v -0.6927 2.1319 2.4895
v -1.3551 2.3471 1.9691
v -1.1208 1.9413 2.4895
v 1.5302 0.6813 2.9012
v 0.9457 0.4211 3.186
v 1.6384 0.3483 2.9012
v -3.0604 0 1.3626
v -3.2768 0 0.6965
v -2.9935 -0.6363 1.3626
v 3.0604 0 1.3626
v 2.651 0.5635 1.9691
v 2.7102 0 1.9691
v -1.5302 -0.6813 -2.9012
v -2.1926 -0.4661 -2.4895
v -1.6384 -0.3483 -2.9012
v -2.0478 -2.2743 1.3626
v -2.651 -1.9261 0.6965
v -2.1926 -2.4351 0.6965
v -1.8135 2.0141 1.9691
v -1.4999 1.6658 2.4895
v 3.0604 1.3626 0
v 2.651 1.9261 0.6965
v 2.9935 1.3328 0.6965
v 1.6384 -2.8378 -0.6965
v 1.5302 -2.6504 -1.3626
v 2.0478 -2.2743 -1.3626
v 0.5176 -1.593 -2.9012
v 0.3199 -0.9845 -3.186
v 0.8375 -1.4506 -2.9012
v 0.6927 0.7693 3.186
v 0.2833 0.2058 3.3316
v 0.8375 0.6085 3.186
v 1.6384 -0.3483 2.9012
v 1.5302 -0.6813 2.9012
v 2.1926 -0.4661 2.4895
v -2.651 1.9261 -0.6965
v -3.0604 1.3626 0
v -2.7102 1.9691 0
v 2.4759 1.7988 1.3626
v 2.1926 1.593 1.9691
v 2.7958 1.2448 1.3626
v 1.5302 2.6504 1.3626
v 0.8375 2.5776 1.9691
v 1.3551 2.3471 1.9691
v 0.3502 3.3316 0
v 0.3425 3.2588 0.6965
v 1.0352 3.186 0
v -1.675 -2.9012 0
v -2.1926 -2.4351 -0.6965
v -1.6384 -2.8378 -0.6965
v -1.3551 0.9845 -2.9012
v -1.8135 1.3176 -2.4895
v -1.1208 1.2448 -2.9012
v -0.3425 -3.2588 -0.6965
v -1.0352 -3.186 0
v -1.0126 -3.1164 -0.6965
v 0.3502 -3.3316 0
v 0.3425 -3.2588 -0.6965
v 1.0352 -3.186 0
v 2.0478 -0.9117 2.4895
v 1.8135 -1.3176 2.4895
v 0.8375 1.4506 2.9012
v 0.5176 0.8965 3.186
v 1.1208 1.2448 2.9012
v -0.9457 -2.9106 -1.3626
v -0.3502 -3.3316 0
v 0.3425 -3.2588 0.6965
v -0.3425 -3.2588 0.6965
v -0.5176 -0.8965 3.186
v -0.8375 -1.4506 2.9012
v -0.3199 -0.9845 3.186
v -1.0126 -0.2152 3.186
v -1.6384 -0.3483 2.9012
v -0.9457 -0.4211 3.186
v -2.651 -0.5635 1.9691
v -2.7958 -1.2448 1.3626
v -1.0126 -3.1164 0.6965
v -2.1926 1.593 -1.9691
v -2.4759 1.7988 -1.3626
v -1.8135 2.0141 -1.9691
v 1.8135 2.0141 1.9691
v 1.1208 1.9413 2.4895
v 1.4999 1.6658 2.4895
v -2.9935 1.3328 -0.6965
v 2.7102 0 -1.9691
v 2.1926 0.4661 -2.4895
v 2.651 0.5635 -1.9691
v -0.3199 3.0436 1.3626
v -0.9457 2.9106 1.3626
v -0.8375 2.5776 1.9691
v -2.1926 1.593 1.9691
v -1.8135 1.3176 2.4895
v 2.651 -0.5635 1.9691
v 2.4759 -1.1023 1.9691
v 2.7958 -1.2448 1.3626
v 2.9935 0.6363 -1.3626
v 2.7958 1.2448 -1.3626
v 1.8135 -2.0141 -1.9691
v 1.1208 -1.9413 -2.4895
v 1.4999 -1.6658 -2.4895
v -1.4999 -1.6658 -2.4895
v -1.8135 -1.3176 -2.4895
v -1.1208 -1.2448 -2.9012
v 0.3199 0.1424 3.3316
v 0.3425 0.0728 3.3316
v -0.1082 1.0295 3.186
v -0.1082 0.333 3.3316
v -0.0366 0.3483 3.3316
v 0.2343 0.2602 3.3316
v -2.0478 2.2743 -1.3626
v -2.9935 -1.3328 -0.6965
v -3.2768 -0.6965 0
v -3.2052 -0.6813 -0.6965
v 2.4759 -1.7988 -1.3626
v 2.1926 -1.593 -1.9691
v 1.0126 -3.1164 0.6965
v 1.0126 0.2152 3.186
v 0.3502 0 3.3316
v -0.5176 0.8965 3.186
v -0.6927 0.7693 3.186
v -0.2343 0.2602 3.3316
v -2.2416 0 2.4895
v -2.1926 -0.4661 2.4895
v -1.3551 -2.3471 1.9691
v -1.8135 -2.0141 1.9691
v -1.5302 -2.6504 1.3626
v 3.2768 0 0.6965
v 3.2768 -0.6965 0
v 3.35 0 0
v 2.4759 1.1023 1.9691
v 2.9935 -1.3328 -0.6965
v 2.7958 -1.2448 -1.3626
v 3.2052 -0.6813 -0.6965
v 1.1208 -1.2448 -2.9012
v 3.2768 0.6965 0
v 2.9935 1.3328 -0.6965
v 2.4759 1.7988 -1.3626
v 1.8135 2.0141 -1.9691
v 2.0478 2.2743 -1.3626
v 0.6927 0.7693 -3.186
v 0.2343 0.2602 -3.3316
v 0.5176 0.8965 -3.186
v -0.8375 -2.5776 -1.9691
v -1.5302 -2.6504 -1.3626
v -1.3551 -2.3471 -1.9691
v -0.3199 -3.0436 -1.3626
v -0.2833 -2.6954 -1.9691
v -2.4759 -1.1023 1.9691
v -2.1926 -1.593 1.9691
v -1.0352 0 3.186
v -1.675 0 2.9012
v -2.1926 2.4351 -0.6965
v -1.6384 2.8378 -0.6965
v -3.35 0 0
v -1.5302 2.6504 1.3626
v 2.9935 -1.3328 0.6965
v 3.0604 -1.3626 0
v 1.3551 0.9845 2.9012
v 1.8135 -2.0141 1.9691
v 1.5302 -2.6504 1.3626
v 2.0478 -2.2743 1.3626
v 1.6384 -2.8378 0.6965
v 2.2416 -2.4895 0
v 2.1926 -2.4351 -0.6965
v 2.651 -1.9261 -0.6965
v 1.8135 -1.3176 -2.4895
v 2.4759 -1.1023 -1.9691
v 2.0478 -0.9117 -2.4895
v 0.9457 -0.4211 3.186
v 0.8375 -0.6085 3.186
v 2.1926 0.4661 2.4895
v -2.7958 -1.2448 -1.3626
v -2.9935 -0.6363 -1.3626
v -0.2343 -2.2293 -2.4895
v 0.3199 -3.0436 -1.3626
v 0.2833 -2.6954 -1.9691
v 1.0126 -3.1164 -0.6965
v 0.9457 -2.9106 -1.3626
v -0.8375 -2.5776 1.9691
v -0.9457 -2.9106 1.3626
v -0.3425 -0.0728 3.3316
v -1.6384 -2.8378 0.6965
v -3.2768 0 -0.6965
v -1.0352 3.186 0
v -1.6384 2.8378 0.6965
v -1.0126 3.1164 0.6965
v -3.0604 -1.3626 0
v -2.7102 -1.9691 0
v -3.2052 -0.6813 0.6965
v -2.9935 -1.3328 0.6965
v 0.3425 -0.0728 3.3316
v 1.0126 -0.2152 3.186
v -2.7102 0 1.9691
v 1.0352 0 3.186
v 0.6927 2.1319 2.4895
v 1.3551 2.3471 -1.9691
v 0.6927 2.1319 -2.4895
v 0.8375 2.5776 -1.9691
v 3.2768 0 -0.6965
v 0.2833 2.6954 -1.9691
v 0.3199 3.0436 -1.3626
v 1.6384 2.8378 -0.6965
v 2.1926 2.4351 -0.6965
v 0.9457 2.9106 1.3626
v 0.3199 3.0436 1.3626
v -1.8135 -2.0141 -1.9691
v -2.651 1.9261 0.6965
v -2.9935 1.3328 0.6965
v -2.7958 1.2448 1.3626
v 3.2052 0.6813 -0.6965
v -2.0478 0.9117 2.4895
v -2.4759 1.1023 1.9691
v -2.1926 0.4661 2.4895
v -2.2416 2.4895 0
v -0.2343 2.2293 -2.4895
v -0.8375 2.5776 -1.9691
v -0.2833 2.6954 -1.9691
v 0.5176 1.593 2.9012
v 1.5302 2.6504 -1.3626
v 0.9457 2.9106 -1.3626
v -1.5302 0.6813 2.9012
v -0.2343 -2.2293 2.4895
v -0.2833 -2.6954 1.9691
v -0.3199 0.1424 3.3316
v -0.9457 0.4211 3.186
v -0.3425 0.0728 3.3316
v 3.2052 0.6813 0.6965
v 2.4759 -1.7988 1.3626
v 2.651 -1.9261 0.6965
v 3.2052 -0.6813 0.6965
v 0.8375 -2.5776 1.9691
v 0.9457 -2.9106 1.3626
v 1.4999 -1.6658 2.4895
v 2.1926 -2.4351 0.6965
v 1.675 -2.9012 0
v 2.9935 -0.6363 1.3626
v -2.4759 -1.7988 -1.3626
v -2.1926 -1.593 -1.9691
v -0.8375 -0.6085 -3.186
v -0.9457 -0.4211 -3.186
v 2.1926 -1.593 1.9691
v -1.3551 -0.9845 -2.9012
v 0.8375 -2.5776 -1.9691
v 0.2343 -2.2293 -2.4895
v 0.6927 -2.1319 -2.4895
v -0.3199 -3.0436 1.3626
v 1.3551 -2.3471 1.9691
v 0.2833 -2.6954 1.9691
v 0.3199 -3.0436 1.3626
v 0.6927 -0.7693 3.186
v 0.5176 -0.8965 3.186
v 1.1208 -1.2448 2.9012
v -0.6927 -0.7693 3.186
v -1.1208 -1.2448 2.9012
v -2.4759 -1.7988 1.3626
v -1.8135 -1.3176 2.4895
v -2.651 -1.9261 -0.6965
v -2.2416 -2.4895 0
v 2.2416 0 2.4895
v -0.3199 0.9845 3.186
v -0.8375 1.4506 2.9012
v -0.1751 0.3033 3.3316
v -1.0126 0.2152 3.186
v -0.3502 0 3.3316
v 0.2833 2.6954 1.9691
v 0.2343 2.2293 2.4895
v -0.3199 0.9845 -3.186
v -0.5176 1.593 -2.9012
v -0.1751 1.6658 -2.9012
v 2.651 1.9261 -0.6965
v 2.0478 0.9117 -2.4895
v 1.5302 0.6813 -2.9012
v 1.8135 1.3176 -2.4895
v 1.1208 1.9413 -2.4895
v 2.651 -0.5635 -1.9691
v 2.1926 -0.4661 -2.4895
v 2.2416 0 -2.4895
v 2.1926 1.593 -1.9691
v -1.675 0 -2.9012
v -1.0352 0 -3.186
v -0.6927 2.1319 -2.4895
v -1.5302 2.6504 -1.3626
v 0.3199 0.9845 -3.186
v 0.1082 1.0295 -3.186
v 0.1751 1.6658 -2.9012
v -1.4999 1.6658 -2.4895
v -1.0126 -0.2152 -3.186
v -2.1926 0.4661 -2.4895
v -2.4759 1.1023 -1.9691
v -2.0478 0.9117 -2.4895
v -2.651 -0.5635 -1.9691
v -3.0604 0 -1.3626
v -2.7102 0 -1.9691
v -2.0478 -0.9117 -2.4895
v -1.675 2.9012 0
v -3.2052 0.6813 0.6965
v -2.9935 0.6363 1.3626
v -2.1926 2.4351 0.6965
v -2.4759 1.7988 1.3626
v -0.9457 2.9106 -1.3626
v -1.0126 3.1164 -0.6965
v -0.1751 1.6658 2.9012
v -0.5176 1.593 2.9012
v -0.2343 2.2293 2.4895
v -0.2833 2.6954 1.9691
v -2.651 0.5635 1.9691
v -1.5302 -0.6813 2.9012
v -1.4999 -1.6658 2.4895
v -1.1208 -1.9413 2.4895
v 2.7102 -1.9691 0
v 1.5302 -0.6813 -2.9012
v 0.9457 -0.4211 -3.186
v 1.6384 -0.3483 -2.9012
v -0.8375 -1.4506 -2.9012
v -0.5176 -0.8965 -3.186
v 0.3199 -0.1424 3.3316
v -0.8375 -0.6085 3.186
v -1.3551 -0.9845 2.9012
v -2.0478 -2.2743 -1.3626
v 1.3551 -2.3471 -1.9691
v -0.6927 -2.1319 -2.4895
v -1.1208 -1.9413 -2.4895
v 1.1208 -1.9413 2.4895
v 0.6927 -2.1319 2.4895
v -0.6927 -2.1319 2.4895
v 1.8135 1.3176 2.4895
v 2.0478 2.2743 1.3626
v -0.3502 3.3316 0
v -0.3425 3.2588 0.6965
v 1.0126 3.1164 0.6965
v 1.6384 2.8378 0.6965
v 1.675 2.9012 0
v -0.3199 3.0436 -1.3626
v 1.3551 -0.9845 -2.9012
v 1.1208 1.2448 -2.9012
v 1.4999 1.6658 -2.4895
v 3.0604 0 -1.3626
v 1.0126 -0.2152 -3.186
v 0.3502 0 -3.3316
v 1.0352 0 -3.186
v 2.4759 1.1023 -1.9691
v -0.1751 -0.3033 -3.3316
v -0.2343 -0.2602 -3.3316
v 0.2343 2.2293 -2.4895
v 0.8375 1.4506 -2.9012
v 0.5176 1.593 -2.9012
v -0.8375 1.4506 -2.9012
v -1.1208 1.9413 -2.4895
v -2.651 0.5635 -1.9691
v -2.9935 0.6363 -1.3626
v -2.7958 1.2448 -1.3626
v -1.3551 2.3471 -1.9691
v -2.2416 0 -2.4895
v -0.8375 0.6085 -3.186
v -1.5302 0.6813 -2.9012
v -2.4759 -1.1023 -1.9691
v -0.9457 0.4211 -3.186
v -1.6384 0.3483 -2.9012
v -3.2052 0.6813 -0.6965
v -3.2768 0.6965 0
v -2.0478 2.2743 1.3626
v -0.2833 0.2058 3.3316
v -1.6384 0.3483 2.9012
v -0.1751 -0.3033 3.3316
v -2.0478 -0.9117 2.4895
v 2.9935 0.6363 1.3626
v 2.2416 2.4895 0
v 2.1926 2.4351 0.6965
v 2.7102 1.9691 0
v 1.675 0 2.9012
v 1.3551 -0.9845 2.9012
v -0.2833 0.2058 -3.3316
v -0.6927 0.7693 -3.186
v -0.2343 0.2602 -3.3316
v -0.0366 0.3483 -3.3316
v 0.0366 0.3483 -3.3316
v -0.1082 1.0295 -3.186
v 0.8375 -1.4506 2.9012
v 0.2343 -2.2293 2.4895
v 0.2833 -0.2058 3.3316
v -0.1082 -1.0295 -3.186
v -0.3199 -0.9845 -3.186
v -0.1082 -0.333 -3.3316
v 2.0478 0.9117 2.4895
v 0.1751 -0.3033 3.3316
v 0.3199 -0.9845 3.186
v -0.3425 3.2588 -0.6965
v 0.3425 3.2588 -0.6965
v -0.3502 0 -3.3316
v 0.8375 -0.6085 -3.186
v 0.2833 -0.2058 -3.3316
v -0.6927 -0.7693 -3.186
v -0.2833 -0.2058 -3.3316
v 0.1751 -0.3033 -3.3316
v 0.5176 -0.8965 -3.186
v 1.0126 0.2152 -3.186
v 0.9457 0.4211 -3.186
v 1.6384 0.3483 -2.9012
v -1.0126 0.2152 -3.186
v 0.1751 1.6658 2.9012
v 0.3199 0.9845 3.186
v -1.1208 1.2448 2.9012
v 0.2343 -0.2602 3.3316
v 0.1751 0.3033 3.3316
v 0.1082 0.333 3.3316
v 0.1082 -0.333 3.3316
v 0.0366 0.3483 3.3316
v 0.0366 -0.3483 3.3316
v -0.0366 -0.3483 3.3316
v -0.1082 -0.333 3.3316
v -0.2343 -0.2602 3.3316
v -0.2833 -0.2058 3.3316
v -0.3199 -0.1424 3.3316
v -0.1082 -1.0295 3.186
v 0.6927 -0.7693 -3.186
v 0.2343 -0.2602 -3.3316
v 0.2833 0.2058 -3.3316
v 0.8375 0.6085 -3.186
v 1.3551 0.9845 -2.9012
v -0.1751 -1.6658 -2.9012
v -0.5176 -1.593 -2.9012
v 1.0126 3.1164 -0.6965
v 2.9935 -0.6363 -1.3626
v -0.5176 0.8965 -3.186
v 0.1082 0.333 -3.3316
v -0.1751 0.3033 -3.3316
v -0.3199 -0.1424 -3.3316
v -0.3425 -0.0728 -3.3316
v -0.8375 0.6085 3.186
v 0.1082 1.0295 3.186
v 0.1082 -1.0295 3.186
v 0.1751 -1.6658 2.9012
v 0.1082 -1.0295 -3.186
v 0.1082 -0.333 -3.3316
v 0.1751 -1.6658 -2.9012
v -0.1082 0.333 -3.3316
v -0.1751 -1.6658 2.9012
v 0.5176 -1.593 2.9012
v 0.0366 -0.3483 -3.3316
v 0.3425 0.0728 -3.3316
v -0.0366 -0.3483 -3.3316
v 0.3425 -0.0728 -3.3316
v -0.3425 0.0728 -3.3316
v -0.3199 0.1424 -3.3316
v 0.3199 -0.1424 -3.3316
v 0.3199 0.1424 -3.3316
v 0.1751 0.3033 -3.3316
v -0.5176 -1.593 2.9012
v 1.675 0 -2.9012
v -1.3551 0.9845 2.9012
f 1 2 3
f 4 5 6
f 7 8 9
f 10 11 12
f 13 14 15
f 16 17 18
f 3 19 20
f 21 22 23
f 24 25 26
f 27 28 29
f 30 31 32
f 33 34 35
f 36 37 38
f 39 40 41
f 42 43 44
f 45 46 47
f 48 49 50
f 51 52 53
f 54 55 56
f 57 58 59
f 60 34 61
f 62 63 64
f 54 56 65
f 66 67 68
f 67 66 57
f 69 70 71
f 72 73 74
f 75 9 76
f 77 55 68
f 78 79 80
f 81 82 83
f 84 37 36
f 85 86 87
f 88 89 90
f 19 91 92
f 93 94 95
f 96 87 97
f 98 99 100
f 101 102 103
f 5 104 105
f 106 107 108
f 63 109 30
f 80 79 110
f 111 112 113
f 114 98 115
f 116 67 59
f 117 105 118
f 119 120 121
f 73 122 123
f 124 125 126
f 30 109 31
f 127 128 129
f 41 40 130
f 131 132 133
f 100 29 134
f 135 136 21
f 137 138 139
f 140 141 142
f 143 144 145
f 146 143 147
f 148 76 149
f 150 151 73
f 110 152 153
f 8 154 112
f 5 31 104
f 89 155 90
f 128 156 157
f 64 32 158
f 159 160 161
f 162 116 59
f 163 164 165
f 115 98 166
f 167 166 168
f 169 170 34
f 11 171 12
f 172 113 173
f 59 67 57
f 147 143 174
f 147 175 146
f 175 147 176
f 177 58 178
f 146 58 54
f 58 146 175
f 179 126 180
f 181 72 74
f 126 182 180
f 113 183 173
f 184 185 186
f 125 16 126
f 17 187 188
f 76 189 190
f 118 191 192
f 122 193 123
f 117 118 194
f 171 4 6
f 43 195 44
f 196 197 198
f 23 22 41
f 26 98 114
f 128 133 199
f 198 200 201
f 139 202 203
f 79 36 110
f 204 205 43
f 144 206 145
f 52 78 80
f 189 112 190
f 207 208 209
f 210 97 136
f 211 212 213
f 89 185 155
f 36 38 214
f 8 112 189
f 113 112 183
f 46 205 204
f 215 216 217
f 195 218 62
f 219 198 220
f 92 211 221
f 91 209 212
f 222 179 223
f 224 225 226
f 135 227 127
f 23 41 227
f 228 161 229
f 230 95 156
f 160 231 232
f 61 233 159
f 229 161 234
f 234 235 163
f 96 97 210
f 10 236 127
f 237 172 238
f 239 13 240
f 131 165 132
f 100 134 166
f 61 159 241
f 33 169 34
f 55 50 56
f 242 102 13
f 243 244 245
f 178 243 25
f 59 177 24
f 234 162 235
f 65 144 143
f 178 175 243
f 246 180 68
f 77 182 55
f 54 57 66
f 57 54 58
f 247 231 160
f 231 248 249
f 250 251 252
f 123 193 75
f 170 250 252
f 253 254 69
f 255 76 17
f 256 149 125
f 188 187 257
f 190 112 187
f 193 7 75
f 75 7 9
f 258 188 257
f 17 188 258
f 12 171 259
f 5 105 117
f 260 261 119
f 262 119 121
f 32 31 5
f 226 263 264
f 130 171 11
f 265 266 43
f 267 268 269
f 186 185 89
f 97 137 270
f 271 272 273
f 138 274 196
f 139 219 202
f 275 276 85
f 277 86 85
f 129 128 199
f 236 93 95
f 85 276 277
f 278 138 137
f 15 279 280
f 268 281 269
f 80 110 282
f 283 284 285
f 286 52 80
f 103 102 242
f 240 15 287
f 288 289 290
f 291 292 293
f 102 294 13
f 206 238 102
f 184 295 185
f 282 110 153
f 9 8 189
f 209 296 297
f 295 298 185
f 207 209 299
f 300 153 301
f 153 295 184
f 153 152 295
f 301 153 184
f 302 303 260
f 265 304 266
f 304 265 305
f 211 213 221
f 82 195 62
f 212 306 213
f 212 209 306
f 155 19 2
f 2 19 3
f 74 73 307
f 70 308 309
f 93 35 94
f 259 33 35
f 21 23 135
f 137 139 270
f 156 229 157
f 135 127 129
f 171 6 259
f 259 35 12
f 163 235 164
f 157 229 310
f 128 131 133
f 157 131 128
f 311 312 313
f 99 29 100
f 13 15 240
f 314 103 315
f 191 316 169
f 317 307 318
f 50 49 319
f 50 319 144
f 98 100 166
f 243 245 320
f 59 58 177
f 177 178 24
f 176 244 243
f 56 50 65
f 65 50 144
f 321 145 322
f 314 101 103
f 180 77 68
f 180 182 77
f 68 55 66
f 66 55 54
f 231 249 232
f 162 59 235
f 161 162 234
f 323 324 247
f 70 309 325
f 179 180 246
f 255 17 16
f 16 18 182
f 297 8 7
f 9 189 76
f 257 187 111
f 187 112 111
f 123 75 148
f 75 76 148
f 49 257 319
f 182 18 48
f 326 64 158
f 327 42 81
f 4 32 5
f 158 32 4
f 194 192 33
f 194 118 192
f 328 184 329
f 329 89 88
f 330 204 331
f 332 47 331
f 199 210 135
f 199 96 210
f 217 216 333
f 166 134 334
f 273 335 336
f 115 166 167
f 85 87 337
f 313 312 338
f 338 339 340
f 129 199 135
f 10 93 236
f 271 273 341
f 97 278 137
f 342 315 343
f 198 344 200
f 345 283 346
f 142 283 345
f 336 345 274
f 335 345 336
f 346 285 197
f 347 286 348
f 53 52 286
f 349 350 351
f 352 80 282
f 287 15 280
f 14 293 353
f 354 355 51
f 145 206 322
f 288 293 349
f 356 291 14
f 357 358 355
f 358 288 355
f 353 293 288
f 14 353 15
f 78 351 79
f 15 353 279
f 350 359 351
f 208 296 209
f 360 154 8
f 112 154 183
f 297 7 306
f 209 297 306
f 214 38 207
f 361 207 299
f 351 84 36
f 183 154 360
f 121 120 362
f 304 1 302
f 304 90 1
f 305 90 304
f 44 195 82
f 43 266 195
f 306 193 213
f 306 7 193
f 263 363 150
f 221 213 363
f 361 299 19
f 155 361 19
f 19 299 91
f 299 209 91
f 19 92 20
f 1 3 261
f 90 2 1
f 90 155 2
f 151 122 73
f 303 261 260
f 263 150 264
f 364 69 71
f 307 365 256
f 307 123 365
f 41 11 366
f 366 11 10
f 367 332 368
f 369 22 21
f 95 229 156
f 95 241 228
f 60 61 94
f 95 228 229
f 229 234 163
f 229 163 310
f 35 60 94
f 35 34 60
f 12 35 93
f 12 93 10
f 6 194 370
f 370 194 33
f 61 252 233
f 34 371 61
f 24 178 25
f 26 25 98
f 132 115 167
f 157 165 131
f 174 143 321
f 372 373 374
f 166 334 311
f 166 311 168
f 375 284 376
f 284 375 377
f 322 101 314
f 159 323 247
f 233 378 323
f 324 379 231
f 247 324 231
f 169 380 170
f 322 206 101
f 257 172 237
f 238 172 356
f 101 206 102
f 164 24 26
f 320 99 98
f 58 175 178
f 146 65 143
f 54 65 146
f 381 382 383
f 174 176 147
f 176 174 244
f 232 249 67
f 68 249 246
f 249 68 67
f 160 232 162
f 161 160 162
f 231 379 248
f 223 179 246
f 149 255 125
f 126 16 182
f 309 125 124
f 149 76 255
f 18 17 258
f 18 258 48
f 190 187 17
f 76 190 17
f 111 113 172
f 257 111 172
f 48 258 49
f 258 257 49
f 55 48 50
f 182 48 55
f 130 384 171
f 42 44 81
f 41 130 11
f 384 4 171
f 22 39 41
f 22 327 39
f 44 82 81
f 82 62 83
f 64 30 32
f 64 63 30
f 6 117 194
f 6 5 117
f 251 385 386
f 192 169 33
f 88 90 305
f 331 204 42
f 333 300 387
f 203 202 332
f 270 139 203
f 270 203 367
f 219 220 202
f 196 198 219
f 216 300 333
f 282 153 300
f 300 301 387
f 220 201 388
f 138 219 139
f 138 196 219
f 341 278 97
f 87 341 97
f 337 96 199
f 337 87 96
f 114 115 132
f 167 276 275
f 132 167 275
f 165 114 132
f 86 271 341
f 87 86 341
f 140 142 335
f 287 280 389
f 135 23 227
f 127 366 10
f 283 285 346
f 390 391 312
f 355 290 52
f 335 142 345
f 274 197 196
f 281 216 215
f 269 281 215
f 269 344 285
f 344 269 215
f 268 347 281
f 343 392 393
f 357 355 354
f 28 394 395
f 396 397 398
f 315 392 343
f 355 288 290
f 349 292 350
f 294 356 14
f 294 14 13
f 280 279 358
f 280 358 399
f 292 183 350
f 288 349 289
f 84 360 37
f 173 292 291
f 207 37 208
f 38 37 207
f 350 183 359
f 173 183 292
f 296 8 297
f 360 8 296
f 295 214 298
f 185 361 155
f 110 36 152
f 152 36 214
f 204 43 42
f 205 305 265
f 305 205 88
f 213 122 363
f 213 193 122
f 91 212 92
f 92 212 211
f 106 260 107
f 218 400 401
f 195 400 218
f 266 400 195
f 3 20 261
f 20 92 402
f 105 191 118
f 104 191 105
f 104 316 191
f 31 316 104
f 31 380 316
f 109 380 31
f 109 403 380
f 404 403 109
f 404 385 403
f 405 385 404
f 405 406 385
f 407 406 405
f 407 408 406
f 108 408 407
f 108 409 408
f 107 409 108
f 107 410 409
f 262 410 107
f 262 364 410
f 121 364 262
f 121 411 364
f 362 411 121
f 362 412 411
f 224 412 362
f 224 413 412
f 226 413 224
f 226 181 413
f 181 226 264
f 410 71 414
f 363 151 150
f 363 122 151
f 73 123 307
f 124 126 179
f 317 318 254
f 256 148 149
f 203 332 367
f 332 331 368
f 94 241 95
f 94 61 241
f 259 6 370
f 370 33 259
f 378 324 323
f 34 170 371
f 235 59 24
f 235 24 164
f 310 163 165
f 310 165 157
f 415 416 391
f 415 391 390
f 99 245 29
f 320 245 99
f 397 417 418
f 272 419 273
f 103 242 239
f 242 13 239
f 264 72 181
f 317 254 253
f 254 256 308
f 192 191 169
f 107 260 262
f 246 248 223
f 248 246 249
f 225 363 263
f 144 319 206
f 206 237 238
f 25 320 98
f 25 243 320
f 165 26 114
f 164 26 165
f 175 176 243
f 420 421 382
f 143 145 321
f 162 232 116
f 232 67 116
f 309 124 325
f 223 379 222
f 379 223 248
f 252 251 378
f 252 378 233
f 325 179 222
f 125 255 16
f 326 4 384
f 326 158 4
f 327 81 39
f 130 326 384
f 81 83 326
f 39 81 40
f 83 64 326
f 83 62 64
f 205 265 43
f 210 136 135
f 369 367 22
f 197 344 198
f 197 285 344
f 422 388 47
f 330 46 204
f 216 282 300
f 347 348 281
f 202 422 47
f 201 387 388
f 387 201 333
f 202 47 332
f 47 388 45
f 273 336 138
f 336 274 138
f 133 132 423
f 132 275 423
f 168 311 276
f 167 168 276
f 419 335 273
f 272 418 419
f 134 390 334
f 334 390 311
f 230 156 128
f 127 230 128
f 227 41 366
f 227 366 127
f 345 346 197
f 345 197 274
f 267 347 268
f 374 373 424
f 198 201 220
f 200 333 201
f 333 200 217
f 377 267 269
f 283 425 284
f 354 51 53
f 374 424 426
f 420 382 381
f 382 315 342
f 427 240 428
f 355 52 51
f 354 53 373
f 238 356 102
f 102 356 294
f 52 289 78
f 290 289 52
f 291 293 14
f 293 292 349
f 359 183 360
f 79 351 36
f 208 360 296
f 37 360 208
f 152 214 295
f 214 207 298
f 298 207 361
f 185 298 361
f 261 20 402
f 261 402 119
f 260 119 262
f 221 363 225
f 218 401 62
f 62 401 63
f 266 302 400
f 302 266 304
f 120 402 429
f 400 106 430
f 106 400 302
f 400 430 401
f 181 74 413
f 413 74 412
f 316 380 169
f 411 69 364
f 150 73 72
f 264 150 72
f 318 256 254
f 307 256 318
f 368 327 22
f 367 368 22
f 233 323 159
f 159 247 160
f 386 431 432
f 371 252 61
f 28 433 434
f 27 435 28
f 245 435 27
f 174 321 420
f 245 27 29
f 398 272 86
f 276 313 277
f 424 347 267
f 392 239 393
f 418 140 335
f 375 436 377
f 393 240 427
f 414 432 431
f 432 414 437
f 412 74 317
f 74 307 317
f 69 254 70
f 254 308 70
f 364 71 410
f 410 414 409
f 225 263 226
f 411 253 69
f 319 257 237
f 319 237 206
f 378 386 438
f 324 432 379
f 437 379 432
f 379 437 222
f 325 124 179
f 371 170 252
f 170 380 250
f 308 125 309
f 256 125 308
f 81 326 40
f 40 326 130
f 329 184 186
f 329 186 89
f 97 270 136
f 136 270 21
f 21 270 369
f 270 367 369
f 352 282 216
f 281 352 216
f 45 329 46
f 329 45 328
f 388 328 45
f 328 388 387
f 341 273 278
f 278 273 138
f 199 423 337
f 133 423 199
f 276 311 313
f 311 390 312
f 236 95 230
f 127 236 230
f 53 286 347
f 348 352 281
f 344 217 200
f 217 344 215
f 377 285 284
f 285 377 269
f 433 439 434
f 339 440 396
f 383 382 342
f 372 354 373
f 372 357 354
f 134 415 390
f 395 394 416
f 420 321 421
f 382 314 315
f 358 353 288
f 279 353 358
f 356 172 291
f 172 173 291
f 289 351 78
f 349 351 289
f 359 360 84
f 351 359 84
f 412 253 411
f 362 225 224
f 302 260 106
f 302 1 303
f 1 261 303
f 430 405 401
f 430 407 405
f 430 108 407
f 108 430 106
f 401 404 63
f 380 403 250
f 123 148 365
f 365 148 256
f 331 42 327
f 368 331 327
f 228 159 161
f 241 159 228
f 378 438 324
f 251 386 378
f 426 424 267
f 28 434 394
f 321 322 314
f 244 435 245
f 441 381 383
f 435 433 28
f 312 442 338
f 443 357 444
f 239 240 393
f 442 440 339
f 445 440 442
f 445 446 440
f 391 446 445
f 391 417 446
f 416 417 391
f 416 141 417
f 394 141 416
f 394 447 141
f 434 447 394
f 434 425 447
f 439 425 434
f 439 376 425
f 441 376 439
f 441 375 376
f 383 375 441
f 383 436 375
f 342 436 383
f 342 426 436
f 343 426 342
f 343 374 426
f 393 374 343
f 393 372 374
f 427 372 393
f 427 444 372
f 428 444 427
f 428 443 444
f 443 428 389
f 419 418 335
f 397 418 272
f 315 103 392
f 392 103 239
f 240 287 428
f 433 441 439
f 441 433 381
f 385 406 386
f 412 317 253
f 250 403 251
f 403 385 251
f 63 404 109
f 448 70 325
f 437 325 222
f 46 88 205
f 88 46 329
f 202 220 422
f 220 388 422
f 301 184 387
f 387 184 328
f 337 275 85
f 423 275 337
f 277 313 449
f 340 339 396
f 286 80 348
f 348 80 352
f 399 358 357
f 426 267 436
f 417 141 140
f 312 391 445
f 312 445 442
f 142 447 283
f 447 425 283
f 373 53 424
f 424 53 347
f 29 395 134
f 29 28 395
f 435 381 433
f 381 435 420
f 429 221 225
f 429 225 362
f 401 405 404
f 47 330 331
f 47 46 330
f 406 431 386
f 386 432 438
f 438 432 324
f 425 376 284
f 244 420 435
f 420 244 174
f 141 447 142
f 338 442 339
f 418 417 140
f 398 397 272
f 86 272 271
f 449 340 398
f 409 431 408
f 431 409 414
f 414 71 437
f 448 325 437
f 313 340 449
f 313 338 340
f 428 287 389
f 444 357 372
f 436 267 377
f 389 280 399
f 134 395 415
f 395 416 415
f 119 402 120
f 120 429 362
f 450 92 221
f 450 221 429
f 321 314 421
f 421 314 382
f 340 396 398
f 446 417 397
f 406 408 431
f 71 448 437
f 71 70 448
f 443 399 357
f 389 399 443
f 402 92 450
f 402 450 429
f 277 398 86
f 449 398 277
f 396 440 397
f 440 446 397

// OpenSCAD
// Mini Tennis Ball - 1:10 Scale (6.7mm diameter)
// Print in TPU for bounce

$fn = 30;

module mini_tennis_ball() {
    difference() {
        sphere(r=3.35); // 6.7mm diameter
        
        // Tennis ball seam pattern
        for(a = [0, 120, 240]) {
            rotate([0, 0, a])
            rotate([90, 0, 0])
            translate([0, 0, 3.35])
            difference() {
                cylinder(h=0.5, r=4, center=true);
                cylinder(h=0.6, r=3.5, center=true);
            }
        }
    }
}

mini_tennis_ball();
